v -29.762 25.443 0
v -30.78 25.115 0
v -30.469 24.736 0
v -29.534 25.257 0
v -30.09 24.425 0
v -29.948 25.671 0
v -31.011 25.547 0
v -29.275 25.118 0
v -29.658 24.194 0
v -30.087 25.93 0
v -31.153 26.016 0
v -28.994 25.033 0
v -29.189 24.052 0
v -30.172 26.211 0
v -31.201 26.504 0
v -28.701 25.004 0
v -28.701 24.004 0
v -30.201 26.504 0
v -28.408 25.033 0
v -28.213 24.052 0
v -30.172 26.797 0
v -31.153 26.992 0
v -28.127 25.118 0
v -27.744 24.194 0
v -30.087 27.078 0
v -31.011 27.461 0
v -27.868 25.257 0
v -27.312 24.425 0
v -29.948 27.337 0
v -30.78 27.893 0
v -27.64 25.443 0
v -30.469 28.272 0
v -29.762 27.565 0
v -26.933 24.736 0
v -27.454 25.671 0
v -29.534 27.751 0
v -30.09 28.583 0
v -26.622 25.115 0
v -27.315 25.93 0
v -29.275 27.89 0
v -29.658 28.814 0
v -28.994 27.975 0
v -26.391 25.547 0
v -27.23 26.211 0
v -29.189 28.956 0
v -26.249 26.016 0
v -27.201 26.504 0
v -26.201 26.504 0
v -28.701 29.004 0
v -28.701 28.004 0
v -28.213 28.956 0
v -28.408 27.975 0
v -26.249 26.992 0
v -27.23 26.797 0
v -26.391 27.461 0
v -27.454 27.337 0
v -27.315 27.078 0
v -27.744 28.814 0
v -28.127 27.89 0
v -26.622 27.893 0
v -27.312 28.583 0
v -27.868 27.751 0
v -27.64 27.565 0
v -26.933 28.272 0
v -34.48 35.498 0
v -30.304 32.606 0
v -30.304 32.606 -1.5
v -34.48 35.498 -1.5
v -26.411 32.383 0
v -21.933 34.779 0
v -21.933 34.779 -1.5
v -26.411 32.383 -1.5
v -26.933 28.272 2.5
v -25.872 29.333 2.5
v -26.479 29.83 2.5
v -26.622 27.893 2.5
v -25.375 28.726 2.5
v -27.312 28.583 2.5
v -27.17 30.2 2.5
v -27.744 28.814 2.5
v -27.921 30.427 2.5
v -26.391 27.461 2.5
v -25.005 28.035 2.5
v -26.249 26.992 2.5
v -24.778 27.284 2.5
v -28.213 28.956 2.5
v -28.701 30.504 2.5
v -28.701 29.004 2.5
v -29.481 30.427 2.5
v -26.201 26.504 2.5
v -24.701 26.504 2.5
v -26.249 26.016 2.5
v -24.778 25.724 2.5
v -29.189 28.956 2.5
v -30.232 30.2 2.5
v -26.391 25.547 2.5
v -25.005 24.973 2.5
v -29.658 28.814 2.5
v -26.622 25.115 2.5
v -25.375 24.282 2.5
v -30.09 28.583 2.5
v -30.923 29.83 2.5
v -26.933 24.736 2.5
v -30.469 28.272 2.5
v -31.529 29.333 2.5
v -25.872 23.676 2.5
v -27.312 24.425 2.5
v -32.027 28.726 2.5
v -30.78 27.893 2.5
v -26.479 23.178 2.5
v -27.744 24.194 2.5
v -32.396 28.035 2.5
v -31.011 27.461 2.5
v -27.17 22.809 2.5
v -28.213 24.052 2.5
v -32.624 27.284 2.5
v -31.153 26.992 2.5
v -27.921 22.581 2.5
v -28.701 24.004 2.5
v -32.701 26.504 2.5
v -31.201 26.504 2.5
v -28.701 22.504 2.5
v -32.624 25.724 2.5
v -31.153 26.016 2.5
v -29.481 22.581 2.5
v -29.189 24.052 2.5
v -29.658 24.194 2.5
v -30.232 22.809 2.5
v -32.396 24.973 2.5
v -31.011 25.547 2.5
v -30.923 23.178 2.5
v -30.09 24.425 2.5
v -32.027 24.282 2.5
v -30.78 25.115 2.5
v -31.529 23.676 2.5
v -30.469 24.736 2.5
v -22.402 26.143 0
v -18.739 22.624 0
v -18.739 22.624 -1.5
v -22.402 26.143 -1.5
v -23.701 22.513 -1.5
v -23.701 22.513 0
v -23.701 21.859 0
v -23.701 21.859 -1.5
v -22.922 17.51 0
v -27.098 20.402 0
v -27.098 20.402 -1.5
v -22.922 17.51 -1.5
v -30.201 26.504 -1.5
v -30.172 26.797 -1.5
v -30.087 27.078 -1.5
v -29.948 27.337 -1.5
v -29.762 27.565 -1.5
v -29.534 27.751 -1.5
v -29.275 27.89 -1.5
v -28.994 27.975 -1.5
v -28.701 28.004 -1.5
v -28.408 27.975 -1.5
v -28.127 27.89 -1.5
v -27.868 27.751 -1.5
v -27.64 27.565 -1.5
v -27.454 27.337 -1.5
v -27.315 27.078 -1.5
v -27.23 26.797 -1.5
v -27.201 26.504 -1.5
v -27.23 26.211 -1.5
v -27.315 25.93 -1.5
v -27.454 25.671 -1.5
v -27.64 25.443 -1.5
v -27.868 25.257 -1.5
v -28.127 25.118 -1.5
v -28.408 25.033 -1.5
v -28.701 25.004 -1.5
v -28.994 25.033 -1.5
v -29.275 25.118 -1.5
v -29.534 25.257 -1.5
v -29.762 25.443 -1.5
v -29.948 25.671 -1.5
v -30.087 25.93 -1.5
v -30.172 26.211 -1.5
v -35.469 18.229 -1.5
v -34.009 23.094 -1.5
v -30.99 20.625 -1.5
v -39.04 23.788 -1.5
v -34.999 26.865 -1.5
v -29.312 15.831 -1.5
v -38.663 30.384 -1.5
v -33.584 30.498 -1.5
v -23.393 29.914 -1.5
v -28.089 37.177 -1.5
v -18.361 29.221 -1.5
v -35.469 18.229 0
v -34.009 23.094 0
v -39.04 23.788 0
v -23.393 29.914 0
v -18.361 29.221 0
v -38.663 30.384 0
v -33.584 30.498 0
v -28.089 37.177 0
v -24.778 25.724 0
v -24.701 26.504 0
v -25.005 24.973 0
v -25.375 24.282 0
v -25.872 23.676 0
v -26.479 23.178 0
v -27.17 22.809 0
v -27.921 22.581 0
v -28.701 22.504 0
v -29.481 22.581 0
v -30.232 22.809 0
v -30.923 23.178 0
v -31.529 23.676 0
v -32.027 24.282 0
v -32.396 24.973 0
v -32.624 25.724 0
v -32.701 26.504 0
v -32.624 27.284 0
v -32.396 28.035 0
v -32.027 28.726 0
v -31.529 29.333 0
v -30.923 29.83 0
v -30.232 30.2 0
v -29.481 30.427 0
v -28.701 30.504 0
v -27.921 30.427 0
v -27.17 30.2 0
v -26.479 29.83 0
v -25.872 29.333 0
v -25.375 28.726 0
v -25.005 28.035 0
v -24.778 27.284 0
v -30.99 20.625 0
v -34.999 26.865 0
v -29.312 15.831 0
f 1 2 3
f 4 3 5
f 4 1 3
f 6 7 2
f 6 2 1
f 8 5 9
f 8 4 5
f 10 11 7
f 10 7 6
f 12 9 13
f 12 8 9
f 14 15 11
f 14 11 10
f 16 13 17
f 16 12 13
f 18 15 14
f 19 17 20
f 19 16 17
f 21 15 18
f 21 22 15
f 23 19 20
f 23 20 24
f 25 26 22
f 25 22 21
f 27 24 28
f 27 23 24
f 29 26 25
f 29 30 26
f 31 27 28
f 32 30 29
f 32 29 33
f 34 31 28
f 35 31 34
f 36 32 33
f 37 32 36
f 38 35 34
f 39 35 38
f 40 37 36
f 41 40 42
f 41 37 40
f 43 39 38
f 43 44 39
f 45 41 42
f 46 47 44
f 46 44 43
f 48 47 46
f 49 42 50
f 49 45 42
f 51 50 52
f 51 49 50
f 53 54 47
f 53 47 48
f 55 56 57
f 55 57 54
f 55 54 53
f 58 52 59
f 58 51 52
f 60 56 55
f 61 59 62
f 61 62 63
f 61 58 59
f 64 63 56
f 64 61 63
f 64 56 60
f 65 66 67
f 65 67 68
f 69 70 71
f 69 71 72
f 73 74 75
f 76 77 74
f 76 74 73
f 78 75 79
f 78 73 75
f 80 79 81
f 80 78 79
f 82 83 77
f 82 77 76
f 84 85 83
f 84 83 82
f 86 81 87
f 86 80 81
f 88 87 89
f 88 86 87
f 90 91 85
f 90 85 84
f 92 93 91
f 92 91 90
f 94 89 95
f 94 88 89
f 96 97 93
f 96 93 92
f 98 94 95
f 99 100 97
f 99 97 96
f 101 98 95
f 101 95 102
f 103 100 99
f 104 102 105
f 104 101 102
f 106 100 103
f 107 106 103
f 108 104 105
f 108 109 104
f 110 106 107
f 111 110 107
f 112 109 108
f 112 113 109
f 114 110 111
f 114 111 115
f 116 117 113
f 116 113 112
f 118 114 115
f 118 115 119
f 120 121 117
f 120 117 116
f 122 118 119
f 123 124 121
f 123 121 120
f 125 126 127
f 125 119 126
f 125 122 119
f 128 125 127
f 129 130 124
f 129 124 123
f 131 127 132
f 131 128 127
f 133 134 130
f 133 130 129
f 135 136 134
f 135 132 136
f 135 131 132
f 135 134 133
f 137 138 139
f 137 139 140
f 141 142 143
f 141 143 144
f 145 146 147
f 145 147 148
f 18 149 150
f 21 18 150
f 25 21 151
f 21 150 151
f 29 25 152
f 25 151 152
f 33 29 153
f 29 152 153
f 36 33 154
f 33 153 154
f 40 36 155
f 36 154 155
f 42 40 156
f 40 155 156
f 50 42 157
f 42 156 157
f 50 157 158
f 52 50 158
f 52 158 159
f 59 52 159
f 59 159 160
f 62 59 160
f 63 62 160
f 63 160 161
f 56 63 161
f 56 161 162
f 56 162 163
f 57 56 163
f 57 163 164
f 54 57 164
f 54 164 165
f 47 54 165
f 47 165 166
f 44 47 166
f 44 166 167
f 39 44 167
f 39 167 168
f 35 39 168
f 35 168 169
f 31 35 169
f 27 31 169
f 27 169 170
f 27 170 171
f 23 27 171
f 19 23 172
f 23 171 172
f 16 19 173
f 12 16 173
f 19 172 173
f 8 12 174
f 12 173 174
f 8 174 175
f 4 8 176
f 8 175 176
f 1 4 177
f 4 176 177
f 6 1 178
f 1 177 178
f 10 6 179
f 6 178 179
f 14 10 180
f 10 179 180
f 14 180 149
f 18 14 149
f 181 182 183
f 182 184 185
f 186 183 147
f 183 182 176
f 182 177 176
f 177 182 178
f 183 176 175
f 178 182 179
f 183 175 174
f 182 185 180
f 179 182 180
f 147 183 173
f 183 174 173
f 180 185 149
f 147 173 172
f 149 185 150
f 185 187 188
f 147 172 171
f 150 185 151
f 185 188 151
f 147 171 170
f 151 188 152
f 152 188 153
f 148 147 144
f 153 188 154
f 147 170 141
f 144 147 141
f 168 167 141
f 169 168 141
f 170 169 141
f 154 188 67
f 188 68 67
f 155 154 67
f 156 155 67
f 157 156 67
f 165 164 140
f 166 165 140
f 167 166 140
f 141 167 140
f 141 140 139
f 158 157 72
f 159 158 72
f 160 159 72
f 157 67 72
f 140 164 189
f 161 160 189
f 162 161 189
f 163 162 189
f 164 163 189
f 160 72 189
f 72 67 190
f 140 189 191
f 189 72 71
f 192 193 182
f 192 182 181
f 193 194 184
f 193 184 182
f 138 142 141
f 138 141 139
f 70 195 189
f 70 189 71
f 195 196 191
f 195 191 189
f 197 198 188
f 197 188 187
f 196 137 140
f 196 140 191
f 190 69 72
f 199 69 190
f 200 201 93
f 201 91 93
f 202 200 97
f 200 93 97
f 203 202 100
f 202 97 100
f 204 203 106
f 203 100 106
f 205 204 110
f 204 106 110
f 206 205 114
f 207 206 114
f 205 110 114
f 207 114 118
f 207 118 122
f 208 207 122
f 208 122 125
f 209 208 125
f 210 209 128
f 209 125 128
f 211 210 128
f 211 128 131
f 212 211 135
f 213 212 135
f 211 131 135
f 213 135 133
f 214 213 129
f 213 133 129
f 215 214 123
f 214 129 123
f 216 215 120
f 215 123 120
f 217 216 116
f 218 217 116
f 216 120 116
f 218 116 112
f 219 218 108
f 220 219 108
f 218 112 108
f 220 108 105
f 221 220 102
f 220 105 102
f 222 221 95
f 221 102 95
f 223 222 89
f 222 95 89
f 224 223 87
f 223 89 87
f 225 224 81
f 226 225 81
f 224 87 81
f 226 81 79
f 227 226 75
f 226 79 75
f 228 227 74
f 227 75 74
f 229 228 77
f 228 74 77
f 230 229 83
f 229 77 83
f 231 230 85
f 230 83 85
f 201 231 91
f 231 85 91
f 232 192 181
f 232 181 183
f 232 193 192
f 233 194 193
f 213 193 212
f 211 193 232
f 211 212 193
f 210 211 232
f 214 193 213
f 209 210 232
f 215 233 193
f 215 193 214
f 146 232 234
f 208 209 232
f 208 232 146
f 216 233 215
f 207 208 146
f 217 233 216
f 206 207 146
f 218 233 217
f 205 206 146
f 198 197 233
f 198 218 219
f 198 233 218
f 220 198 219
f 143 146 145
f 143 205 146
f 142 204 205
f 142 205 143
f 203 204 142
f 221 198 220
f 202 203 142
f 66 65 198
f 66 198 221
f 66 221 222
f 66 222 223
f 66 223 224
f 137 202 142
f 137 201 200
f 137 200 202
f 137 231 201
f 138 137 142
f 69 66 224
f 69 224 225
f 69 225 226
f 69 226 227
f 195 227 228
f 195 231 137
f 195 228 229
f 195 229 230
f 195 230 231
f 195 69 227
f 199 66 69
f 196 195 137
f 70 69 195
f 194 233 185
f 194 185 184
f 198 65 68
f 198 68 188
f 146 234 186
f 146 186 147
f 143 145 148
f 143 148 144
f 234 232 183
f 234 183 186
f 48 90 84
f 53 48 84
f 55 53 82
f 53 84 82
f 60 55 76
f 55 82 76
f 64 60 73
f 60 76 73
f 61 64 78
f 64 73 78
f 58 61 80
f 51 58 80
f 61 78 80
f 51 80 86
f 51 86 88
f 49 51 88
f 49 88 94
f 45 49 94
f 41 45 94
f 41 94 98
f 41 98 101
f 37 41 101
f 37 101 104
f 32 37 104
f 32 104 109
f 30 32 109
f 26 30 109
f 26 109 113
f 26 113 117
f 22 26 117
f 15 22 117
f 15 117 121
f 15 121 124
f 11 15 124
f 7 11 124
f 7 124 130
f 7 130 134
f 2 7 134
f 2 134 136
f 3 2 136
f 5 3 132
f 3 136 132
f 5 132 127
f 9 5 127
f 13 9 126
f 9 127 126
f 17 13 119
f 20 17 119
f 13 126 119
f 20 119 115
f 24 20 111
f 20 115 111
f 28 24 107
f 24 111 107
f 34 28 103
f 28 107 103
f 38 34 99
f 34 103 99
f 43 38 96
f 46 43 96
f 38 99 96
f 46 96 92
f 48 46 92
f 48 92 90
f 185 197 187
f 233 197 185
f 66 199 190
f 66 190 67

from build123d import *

# Parameters (mm, degrees)
BOSS_EXTRU_1_DEPTH                                = 1.5
ESQUISSE2_W                                       = 4
ESQUISSE2_H                                       = 2.5
CHAMBRAGE_POUR_VIS_T_TE_HEXAGONALE_M2_D           = 3
CHAMBRAGE_POUR_VIS_T_TE_HEXAGONALE_M2_DEPTH       = 4
CHAMBRAGE_POUR_VIS_T_TE_HEXAGONALE_M2_CBORE_D     = 5
CHAMBRAGE_POUR_VIS_T_TE_HEXAGONALE_M2_CBORE_DEPTH = 2.5
CHANFREIN1_SIZE                                   = 0.66150504
CHANFREIN1_SIZE2                                  = 0.116617787


with BuildPart() as part:
    # Esquisse1 → Boss.-Extru.1 (new body)
    with BuildSketch(Plane.XY):
        Polygon((-27.097787955, 20.402380339), (-22.922211673, 17.509970722), (-23.817460632, 22.509970718), (-18.739232742, 22.624304328), (-22.402430623, 26.143175168), (-18.36126158, 29.220580467), (-23.393191293, 29.914233086), (-21.932670307, 34.779245838), (-26.411305743, 32.382728509), (-28.089302186, 37.177079198), (-30.303956824, 32.605780103), (-34.479533107, 35.49818972), (-33.584284152, 30.498189734), (-38.662512037, 30.383856115), (-34.999314157, 26.864985274), (-39.040483199, 23.787579976), (-34.008553486, 23.093927357), (-35.469074473, 18.228914604), (-30.990439036, 20.625431934), (-29.312442593, 15.831081245), align=None)
    extrude(amount=-BOSS_EXTRU_1_DEPTH)

    # Esquisse2 → Révolution1 (revolve)
    with BuildSketch(Plane.XZ.offset(-26.504080221)):
        with Locations((-26.70087239, 1.25)):
            Rectangle(ESQUISSE2_W, ESQUISSE2_H)
    revolve(axis=Axis((-28.70087239, 26.504080221, 2.5), (0, 0, -1)))

    # Chambrage pour vis à tête hexagonale M2.51
    with Locations(Plane.XY.offset(2.5)):
        with Locations((-28.70087239, 26.504080221)):
            CounterBoreHole(CHAMBRAGE_POUR_VIS_T_TE_HEXAGONALE_M2_D / 2, CHAMBRAGE_POUR_VIS_T_TE_HEXAGONALE_M2_CBORE_D / 2, CHAMBRAGE_POUR_VIS_T_TE_HEXAGONALE_M2_CBORE_DEPTH, depth=CHAMBRAGE_POUR_VIS_T_TE_HEXAGONALE_M2_DEPTH)

    # Chanfrein1
    chanfrein1_edges = [part.edges().sort_by_distance(p)[0] for p in [
        (-23.817460632, 22.509970718, -0.75),
    ]]
    chanfrein1_side = [part.faces().sort_by_distance(p)[0] for p in [
        (-23.369836152, 20.00997072, -0.75),
    ]]
    chamfer(chanfrein1_edges, length=CHANFREIN1_SIZE, length2=CHANFREIN1_SIZE2, reference=chanfrein1_side[0])


solid = part.part
